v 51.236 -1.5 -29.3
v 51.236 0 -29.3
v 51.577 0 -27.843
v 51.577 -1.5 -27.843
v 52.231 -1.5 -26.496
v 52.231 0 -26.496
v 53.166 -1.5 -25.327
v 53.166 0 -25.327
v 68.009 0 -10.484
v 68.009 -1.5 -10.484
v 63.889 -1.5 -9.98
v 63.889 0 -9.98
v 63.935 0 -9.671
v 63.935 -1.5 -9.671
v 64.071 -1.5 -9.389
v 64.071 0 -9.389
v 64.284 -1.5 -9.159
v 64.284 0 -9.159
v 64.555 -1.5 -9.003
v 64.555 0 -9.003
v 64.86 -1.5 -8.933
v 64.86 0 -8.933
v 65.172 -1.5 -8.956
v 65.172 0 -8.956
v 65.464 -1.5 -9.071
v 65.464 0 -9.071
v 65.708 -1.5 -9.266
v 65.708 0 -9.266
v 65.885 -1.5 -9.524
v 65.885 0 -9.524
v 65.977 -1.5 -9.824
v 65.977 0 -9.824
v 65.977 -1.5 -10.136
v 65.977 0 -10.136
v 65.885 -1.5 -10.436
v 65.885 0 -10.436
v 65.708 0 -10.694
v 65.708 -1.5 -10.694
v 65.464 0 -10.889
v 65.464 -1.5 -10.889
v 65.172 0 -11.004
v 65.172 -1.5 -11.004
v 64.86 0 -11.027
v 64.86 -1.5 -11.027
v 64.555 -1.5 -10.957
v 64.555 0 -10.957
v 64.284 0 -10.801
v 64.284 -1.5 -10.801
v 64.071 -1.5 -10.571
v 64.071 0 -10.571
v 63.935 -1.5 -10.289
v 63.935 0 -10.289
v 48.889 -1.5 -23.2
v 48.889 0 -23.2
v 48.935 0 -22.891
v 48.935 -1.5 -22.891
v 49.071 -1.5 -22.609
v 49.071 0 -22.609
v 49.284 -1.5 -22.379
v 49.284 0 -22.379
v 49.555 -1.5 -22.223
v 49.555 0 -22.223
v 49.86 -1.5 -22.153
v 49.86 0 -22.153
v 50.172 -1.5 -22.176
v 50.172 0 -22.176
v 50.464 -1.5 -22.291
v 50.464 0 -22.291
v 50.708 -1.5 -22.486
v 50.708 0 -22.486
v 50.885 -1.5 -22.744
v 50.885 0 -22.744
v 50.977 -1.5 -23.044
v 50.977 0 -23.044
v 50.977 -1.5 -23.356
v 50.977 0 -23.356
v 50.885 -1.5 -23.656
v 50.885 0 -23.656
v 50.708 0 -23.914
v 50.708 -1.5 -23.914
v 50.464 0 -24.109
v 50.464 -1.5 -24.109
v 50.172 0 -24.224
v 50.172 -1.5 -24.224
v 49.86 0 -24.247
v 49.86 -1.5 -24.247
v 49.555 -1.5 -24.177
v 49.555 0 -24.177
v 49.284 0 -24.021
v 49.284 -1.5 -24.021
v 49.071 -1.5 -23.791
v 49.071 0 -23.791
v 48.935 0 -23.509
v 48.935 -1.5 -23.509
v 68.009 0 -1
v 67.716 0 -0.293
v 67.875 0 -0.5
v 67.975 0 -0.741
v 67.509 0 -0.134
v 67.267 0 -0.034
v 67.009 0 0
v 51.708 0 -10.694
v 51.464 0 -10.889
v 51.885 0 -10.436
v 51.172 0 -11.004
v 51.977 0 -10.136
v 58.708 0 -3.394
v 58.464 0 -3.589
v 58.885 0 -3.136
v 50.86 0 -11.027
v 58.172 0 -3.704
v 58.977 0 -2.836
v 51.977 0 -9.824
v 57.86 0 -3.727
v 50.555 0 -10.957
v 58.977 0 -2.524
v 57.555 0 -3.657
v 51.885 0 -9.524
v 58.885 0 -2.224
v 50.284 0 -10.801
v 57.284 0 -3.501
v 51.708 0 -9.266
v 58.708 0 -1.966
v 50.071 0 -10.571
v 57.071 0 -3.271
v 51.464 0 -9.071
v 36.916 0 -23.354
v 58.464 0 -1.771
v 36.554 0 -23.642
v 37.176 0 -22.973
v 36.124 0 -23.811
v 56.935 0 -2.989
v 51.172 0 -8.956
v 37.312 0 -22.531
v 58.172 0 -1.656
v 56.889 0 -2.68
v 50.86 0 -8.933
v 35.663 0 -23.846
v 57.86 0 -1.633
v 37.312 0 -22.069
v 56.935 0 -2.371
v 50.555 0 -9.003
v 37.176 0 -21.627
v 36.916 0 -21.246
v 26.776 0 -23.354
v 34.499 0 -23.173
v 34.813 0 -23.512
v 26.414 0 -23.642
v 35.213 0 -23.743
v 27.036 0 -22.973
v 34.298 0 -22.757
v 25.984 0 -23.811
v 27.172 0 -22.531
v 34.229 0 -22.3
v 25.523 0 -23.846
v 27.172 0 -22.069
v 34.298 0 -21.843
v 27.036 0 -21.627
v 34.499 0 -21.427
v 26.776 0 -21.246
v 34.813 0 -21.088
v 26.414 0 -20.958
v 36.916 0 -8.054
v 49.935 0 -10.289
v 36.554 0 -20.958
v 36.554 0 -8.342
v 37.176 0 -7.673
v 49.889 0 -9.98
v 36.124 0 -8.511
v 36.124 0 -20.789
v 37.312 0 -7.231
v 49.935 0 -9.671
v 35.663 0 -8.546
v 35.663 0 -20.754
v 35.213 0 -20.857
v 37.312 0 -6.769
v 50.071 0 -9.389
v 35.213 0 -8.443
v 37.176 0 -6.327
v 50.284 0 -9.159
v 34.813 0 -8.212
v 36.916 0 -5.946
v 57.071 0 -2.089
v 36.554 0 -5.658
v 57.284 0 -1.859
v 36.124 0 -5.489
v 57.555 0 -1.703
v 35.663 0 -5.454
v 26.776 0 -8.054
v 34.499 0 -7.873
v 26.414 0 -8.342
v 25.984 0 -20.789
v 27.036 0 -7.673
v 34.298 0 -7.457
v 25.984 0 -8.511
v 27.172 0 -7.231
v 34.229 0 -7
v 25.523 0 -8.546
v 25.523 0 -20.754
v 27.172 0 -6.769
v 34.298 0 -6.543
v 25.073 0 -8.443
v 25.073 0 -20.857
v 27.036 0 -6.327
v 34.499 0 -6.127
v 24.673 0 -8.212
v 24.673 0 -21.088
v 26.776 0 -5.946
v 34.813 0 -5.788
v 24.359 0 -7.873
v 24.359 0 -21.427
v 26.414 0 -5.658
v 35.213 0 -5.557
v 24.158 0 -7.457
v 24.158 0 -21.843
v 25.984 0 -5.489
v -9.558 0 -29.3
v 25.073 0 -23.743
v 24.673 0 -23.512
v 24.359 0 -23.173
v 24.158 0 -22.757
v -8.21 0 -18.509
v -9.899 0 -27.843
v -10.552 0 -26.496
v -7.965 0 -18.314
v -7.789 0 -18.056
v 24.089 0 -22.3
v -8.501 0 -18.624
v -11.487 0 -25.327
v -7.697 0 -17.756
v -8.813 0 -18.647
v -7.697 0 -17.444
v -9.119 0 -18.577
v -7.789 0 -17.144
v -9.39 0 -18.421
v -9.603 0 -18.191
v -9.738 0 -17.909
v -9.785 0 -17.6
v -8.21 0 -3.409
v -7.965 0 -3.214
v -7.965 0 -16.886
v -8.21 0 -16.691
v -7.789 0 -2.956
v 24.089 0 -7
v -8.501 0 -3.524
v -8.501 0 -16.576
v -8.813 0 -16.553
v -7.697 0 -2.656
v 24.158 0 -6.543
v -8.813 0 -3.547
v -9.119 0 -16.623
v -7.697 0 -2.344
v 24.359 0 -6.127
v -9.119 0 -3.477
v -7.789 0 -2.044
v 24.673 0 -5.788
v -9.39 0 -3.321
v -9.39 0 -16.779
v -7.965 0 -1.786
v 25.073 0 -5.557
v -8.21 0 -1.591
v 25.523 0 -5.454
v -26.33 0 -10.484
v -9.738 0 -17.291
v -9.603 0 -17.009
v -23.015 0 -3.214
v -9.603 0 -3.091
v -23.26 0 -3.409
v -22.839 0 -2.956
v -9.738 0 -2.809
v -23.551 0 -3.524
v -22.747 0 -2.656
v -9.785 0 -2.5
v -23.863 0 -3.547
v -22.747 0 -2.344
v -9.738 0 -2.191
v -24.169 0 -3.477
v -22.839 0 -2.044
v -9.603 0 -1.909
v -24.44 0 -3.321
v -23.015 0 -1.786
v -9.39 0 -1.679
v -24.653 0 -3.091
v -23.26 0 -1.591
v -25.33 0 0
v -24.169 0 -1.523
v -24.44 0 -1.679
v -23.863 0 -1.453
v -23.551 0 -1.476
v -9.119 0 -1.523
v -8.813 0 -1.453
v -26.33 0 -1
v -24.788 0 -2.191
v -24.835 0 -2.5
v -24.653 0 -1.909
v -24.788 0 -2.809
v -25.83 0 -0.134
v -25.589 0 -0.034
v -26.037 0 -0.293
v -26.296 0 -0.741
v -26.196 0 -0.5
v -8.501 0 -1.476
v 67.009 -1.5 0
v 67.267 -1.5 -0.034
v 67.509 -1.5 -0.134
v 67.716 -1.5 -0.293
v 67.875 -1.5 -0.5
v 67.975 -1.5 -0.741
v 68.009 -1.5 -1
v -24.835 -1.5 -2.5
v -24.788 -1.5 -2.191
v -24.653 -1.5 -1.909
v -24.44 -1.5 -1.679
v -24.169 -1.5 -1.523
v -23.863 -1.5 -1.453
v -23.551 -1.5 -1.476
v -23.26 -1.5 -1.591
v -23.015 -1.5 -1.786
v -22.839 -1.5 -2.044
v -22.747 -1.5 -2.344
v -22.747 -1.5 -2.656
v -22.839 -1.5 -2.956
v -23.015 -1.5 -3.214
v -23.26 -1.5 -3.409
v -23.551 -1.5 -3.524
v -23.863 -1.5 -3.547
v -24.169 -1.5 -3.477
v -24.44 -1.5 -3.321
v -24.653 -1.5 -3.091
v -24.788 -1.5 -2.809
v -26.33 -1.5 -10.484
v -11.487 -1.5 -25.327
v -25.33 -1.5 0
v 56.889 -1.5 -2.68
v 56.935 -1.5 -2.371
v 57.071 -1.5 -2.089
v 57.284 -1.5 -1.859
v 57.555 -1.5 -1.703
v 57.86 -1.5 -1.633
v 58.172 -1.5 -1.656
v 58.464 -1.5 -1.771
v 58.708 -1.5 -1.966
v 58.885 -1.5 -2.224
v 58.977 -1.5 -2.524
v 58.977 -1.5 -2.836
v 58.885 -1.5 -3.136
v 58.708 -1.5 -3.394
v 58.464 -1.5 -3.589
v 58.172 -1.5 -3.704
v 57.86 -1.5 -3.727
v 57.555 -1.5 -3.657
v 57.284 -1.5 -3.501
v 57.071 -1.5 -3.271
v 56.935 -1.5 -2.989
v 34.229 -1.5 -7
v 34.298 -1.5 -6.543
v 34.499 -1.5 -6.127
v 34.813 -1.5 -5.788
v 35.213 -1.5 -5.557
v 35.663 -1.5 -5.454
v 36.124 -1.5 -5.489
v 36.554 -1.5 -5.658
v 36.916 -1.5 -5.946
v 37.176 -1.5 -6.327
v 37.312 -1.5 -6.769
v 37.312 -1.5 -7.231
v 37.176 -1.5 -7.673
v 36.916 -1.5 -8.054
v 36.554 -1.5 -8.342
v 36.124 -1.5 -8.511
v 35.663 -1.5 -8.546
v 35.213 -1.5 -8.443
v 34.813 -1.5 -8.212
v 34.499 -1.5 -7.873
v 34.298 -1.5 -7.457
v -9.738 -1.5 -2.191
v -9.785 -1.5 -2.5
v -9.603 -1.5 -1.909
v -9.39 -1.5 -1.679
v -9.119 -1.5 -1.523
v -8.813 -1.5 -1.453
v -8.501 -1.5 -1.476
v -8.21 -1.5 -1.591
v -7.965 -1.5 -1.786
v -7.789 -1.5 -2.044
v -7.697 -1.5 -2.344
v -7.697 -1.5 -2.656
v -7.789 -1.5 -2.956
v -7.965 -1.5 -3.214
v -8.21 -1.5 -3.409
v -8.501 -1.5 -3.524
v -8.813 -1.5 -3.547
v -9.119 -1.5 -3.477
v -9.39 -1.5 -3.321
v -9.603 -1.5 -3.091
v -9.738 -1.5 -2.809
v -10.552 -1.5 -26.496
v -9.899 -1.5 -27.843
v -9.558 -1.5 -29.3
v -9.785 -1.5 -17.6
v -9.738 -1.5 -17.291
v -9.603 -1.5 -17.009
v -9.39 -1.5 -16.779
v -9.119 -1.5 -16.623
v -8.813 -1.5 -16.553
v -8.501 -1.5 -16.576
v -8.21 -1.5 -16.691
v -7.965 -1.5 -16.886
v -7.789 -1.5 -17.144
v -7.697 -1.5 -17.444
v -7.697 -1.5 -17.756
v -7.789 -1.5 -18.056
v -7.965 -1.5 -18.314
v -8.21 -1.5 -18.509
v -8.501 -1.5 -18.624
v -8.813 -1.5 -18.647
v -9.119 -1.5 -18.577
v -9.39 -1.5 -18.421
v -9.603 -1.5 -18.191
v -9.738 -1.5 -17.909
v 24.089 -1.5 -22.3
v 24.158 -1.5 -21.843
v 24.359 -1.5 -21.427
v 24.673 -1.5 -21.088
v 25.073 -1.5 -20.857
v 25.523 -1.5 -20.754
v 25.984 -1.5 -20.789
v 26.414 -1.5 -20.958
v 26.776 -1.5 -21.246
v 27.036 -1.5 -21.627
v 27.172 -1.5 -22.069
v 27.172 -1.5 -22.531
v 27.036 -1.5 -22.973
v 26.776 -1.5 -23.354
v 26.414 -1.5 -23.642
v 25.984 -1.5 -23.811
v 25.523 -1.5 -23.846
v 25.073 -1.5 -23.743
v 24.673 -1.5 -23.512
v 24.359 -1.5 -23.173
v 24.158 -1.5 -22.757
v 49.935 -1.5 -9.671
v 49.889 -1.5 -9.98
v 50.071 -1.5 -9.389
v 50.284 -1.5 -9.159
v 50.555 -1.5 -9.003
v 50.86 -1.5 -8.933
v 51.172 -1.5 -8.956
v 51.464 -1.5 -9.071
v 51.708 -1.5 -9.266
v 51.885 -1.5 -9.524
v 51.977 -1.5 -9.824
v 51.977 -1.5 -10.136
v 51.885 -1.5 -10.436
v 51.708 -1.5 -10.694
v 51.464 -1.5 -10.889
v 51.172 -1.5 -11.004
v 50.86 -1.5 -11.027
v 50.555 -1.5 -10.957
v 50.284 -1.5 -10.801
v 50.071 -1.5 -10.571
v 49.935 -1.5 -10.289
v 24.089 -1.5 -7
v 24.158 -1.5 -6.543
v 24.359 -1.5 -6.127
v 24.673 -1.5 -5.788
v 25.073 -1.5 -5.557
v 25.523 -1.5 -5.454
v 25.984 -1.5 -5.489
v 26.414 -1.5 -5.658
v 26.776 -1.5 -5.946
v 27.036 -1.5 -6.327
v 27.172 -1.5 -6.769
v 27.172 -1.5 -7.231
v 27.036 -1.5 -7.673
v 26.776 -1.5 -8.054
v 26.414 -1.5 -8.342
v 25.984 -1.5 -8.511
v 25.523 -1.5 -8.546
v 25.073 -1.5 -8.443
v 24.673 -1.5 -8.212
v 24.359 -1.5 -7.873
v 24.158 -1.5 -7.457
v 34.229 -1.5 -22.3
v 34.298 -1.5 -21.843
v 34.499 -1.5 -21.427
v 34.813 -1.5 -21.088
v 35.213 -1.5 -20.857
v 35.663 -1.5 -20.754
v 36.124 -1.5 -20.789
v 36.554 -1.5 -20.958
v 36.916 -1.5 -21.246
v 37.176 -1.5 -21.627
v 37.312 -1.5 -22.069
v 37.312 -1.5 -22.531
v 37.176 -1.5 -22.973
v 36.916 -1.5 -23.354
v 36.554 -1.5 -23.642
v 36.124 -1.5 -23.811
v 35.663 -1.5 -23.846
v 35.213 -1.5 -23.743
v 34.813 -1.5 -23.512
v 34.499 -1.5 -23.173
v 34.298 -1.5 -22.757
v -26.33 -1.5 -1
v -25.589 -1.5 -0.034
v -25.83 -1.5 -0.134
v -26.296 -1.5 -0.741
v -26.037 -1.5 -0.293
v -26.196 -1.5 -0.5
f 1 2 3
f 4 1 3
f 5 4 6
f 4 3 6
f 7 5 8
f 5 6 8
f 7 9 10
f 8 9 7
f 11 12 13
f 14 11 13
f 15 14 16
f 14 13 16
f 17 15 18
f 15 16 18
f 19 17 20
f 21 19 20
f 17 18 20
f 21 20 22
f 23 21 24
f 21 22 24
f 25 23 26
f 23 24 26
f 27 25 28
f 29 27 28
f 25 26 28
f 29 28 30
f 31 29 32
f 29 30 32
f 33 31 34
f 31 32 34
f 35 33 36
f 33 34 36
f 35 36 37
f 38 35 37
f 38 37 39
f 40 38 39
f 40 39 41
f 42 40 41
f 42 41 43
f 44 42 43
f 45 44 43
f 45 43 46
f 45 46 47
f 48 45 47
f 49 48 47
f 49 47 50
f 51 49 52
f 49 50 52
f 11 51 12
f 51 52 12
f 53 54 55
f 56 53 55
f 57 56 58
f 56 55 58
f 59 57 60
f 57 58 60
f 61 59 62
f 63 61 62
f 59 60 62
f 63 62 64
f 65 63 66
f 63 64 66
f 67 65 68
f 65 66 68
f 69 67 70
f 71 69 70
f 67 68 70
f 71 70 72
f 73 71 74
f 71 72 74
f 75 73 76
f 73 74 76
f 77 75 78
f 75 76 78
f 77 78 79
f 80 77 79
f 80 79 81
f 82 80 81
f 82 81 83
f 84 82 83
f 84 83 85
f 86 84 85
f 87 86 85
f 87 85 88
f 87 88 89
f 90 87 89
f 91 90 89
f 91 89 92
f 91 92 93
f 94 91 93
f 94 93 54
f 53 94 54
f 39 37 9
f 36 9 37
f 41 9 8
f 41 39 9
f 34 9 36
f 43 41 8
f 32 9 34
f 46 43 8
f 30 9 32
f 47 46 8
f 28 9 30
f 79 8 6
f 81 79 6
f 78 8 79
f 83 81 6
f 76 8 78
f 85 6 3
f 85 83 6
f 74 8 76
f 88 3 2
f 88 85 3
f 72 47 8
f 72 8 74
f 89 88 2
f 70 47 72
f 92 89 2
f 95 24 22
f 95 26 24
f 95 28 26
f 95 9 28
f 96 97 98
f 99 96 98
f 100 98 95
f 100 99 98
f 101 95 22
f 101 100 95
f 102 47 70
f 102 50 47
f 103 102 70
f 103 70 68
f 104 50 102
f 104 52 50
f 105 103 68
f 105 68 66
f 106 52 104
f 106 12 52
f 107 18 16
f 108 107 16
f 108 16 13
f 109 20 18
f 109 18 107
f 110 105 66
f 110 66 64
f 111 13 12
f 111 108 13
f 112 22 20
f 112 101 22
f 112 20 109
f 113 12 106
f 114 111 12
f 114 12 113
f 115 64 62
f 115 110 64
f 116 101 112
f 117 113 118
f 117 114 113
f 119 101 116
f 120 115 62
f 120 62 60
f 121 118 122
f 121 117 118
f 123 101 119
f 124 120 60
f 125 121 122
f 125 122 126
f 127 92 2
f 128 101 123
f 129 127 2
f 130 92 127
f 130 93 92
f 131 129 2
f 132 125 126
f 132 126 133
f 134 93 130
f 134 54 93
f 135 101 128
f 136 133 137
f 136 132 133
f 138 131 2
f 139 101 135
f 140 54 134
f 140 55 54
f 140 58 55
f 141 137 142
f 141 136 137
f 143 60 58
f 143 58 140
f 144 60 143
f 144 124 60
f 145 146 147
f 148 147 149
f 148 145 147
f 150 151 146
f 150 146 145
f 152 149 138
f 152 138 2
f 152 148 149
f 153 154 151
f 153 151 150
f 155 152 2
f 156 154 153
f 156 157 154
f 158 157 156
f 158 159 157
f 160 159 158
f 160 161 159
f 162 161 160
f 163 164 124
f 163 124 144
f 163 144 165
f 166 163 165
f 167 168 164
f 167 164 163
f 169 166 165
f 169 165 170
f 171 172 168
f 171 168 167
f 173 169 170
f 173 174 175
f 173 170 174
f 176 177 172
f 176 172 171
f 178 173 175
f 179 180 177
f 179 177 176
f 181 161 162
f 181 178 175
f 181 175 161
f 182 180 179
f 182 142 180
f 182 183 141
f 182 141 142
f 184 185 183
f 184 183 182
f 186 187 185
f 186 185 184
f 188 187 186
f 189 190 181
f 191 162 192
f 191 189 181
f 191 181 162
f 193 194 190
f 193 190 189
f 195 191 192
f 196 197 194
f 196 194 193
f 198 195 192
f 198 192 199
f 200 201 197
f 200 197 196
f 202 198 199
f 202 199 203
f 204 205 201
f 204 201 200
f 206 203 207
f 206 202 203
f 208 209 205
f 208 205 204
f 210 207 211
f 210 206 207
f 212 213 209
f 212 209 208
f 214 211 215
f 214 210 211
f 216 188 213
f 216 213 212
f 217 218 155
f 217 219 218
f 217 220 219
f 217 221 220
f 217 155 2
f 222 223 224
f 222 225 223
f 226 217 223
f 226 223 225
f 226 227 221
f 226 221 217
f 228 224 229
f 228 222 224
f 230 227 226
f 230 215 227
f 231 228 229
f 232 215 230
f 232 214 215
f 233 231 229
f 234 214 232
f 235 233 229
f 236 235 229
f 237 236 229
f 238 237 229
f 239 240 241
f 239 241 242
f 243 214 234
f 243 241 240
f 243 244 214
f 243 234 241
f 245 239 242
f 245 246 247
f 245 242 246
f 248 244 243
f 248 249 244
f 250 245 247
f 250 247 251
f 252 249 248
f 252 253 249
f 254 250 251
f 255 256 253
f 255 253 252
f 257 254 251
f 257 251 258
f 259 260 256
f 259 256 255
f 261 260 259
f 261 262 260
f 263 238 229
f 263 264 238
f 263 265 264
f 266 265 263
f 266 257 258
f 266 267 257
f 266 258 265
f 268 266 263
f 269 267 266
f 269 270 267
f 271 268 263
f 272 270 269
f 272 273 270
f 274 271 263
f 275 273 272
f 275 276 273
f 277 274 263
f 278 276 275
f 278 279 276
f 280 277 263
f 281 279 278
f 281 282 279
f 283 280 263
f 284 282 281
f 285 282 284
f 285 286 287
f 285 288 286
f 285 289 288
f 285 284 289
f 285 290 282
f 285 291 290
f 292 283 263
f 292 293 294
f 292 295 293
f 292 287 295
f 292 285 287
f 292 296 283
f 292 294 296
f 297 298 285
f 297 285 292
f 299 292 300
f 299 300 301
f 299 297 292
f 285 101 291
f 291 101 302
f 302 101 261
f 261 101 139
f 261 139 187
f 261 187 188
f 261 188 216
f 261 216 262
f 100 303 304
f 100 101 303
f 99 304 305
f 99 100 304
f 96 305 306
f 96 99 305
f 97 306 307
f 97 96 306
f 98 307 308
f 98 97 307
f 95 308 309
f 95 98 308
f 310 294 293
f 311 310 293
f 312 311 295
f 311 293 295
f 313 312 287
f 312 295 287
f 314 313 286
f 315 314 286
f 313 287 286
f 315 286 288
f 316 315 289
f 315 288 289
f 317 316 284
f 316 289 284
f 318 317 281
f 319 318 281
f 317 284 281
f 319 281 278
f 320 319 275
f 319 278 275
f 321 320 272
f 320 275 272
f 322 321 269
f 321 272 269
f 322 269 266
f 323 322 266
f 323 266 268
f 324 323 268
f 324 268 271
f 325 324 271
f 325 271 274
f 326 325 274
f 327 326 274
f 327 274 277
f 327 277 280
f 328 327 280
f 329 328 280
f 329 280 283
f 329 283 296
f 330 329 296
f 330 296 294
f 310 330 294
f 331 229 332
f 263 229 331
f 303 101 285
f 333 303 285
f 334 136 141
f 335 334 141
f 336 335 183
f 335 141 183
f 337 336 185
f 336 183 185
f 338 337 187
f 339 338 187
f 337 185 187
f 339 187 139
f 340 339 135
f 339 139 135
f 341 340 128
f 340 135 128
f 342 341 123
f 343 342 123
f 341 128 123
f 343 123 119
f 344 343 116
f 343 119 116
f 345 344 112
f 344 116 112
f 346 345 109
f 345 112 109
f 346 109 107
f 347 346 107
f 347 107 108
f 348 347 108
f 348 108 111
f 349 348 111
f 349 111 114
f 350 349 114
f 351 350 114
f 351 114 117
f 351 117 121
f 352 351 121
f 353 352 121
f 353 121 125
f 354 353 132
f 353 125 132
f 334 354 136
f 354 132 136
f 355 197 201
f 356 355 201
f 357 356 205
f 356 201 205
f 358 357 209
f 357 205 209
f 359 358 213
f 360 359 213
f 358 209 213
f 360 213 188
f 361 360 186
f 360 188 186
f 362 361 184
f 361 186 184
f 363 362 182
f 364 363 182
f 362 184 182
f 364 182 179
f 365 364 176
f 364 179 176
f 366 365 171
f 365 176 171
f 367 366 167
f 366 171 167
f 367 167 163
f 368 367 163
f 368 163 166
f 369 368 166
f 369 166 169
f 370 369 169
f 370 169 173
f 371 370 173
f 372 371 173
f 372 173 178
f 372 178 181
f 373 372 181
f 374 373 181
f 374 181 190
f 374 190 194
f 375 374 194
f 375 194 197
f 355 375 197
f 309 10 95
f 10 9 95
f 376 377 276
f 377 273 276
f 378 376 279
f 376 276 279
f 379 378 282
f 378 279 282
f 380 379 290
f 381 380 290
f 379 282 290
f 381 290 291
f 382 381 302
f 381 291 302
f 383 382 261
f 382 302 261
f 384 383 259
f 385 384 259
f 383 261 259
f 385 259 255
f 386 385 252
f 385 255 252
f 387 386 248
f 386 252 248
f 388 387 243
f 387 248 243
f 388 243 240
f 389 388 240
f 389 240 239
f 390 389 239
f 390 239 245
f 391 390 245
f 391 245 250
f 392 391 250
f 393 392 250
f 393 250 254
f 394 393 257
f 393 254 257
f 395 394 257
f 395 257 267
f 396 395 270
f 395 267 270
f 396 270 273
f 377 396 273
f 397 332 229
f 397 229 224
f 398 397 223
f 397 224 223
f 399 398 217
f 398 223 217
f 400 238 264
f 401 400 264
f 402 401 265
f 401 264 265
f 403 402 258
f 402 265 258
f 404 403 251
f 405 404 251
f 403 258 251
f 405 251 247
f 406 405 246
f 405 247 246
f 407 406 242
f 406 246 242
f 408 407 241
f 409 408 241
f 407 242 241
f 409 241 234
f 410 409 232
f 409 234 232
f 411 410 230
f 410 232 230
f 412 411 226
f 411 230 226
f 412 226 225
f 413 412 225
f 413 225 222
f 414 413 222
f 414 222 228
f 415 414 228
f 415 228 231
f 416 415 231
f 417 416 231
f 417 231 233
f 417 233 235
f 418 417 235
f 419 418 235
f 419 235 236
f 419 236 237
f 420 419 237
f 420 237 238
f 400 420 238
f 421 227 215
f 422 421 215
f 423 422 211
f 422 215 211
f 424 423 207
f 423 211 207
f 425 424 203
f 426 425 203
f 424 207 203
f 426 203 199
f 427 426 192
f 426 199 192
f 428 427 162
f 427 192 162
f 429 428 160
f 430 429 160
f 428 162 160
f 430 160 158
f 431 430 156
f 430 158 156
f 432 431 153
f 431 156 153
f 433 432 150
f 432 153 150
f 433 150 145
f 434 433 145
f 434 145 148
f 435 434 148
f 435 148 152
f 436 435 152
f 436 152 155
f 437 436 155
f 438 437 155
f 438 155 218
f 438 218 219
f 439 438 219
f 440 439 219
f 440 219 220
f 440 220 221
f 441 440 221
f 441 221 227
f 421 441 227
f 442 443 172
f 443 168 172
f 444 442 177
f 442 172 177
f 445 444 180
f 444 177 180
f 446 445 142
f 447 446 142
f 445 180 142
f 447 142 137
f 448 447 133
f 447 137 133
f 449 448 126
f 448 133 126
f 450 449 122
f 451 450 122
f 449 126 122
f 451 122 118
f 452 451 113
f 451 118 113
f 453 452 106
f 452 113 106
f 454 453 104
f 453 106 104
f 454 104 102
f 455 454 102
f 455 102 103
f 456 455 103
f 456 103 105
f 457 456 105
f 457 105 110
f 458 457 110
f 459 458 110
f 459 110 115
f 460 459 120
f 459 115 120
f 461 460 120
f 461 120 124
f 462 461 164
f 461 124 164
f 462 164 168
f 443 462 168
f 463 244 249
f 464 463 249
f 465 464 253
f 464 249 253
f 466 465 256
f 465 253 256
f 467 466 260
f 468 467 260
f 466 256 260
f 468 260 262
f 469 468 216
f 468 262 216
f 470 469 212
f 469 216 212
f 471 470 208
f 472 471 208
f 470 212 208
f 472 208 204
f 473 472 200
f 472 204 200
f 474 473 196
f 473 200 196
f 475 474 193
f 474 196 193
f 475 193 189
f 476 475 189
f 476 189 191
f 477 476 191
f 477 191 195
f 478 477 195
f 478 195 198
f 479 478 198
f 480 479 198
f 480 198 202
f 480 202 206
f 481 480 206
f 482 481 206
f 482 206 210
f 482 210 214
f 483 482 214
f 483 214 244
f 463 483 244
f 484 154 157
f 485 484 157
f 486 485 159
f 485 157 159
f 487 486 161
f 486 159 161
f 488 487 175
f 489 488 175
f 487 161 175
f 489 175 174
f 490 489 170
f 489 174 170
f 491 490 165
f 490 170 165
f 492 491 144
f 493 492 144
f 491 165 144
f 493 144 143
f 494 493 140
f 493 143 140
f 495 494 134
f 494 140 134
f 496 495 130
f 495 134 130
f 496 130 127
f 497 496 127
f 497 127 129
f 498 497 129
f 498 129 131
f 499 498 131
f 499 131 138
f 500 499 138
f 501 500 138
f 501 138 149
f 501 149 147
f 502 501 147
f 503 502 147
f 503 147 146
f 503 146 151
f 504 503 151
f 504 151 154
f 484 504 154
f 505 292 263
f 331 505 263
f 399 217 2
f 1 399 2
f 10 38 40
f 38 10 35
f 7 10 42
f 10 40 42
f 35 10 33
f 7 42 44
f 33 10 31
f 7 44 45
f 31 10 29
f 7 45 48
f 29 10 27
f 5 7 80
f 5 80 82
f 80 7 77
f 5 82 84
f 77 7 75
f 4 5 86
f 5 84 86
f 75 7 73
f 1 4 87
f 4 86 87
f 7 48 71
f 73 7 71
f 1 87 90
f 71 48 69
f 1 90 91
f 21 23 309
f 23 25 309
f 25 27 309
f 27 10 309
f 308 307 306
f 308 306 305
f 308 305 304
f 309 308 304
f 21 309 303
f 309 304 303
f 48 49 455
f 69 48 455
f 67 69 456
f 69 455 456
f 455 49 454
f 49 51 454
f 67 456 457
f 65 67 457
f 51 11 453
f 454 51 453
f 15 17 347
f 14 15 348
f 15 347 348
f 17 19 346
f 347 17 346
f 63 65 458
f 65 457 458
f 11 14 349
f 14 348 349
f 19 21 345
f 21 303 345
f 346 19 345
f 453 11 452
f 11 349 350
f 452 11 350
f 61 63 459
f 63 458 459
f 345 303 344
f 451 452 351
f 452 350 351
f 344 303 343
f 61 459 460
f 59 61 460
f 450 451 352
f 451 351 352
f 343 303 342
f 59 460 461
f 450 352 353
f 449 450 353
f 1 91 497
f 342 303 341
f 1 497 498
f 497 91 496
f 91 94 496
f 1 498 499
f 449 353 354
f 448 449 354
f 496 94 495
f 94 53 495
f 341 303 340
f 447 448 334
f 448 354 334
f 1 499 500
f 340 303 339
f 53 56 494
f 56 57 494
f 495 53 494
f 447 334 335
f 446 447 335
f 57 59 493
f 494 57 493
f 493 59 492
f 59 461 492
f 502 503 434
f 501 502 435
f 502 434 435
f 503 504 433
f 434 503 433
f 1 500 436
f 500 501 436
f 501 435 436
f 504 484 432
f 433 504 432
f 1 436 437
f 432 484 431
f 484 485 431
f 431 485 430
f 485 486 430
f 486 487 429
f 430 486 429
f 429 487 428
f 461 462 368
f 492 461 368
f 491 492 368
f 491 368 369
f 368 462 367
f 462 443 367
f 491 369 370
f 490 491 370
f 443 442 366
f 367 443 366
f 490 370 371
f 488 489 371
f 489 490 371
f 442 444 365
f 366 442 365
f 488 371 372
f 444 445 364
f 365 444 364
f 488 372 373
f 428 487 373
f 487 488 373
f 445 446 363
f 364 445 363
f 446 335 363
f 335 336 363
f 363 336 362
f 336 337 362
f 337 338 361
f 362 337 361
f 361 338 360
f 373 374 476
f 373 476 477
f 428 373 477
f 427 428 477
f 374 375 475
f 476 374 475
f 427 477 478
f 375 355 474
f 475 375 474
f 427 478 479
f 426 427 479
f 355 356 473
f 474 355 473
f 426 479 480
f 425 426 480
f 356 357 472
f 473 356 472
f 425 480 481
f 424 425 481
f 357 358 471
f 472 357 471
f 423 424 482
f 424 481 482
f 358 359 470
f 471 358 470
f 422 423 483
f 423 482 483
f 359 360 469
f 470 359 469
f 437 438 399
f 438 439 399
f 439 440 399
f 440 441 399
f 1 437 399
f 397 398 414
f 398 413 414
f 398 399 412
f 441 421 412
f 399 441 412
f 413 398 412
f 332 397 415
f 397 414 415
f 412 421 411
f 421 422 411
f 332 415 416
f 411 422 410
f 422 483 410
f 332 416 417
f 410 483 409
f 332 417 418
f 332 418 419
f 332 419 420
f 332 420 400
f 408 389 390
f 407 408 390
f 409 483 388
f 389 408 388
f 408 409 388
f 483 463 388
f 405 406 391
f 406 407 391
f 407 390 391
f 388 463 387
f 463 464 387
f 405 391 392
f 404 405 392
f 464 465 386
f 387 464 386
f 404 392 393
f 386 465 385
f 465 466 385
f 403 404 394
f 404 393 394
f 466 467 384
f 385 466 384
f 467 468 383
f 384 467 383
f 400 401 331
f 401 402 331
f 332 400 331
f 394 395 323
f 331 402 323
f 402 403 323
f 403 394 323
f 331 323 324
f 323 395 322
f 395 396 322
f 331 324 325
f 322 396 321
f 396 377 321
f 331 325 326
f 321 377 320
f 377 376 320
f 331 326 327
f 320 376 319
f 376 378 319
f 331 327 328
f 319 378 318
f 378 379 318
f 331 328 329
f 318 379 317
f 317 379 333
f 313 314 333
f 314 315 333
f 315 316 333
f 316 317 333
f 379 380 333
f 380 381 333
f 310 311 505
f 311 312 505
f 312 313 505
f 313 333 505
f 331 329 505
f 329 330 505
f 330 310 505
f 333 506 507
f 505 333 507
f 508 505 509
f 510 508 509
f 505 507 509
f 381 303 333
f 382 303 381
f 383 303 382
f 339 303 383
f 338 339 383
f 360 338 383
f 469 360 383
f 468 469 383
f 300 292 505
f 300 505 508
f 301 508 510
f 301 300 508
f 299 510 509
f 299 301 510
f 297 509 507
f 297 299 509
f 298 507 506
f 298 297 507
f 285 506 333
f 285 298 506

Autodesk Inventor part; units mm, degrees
ref_plane "YZ Plane" through (0, 0, 0) normal (1, 0, 0) x (0, 1, 0)
ref_plane "XZ Plane" through (0, 0, 0) normal (0, 1, 0) x (-1, 0, 0)
ref_plane "XY Plane" through (0, 0, 0) normal (0, 0, 1) x (1, 0, 0)
sketch "Sketch1" plane through (0, 0, 0) normal (0, 1, 0) x (-1, 0, 0)
  line L0 (-0.4496, -29.3) -> (-0.4496, 0)
  line L1 (-41.2289, 0) -> (-41.2289, -29.3)
  circle A0 centre (8.735, -17.6) radius 1.05
  circle A1 centre (8.735, -2.5) radius 1.05
  circle A2 centre (23.785, -2.5) radius 1.05
  circle A3 centre (-25.6393, -7) radius 1.55
  circle A4 centre (-35.7793, -7) radius 1.55
  circle A5 centre (-25.6393, -22.3) radius 1.55
  circle A6 centre (-35.7793, -22.3) radius 1.55
  circle A7 centre (-49.9386, -23.2) radius 1.05
  circle A8 centre (-50.9386, -9.98) radius 1.05
  circle A9 centre (-57.9386, -2.68) radius 1.05
  circle A10 centre (-64.9386, -9.98) radius 1.05
  line L2 (11.487, -25.327) -> (26.33, -10.4841)
  line L3 (26.33, -1) -> (26.33, -10.4841)
  line L4 (-68.0086, -10.4841) -> (-53.1656, -25.327)
  line L5 (-68.0086, -10.4841) -> (-68.0086, -1)
  arc A11 (-51.2361, -29.3) -> (-53.1656, -25.327) centre (-57.9386, -30.1) ccw
  line L6 (9.5576, -29.3) -> (-51.2361, -29.3)
  arc A12 (11.487, -25.327) -> (9.5576, -29.3) centre (16.26, -30.1) ccw
  arc A13 (26.33, -1) -> (25.33, 0) centre (25.33, -1) ccw
  line L7 (-67.0086, 0) -> (25.33, 0)
  arc A14 (-67.0086, 0) -> (-68.0086, -1) centre (-67.0086, -1) ccw
  line L8 (-41.6786, -29.3) -> (-41.6786, 0)
  line L9 (-40.7793, 0) -> (-40.7793, -29.3)
  line L10 (-0.8993, -29.3) -> (-0.8993, 0)
  line L11 (0, 0) -> (0, -29.3)
  point P0 (0, 0)
extrude "Extrusion1" add sketch "Sketch1" against normal blind 1.5
properties part number "axis_21_bottom_frame"
